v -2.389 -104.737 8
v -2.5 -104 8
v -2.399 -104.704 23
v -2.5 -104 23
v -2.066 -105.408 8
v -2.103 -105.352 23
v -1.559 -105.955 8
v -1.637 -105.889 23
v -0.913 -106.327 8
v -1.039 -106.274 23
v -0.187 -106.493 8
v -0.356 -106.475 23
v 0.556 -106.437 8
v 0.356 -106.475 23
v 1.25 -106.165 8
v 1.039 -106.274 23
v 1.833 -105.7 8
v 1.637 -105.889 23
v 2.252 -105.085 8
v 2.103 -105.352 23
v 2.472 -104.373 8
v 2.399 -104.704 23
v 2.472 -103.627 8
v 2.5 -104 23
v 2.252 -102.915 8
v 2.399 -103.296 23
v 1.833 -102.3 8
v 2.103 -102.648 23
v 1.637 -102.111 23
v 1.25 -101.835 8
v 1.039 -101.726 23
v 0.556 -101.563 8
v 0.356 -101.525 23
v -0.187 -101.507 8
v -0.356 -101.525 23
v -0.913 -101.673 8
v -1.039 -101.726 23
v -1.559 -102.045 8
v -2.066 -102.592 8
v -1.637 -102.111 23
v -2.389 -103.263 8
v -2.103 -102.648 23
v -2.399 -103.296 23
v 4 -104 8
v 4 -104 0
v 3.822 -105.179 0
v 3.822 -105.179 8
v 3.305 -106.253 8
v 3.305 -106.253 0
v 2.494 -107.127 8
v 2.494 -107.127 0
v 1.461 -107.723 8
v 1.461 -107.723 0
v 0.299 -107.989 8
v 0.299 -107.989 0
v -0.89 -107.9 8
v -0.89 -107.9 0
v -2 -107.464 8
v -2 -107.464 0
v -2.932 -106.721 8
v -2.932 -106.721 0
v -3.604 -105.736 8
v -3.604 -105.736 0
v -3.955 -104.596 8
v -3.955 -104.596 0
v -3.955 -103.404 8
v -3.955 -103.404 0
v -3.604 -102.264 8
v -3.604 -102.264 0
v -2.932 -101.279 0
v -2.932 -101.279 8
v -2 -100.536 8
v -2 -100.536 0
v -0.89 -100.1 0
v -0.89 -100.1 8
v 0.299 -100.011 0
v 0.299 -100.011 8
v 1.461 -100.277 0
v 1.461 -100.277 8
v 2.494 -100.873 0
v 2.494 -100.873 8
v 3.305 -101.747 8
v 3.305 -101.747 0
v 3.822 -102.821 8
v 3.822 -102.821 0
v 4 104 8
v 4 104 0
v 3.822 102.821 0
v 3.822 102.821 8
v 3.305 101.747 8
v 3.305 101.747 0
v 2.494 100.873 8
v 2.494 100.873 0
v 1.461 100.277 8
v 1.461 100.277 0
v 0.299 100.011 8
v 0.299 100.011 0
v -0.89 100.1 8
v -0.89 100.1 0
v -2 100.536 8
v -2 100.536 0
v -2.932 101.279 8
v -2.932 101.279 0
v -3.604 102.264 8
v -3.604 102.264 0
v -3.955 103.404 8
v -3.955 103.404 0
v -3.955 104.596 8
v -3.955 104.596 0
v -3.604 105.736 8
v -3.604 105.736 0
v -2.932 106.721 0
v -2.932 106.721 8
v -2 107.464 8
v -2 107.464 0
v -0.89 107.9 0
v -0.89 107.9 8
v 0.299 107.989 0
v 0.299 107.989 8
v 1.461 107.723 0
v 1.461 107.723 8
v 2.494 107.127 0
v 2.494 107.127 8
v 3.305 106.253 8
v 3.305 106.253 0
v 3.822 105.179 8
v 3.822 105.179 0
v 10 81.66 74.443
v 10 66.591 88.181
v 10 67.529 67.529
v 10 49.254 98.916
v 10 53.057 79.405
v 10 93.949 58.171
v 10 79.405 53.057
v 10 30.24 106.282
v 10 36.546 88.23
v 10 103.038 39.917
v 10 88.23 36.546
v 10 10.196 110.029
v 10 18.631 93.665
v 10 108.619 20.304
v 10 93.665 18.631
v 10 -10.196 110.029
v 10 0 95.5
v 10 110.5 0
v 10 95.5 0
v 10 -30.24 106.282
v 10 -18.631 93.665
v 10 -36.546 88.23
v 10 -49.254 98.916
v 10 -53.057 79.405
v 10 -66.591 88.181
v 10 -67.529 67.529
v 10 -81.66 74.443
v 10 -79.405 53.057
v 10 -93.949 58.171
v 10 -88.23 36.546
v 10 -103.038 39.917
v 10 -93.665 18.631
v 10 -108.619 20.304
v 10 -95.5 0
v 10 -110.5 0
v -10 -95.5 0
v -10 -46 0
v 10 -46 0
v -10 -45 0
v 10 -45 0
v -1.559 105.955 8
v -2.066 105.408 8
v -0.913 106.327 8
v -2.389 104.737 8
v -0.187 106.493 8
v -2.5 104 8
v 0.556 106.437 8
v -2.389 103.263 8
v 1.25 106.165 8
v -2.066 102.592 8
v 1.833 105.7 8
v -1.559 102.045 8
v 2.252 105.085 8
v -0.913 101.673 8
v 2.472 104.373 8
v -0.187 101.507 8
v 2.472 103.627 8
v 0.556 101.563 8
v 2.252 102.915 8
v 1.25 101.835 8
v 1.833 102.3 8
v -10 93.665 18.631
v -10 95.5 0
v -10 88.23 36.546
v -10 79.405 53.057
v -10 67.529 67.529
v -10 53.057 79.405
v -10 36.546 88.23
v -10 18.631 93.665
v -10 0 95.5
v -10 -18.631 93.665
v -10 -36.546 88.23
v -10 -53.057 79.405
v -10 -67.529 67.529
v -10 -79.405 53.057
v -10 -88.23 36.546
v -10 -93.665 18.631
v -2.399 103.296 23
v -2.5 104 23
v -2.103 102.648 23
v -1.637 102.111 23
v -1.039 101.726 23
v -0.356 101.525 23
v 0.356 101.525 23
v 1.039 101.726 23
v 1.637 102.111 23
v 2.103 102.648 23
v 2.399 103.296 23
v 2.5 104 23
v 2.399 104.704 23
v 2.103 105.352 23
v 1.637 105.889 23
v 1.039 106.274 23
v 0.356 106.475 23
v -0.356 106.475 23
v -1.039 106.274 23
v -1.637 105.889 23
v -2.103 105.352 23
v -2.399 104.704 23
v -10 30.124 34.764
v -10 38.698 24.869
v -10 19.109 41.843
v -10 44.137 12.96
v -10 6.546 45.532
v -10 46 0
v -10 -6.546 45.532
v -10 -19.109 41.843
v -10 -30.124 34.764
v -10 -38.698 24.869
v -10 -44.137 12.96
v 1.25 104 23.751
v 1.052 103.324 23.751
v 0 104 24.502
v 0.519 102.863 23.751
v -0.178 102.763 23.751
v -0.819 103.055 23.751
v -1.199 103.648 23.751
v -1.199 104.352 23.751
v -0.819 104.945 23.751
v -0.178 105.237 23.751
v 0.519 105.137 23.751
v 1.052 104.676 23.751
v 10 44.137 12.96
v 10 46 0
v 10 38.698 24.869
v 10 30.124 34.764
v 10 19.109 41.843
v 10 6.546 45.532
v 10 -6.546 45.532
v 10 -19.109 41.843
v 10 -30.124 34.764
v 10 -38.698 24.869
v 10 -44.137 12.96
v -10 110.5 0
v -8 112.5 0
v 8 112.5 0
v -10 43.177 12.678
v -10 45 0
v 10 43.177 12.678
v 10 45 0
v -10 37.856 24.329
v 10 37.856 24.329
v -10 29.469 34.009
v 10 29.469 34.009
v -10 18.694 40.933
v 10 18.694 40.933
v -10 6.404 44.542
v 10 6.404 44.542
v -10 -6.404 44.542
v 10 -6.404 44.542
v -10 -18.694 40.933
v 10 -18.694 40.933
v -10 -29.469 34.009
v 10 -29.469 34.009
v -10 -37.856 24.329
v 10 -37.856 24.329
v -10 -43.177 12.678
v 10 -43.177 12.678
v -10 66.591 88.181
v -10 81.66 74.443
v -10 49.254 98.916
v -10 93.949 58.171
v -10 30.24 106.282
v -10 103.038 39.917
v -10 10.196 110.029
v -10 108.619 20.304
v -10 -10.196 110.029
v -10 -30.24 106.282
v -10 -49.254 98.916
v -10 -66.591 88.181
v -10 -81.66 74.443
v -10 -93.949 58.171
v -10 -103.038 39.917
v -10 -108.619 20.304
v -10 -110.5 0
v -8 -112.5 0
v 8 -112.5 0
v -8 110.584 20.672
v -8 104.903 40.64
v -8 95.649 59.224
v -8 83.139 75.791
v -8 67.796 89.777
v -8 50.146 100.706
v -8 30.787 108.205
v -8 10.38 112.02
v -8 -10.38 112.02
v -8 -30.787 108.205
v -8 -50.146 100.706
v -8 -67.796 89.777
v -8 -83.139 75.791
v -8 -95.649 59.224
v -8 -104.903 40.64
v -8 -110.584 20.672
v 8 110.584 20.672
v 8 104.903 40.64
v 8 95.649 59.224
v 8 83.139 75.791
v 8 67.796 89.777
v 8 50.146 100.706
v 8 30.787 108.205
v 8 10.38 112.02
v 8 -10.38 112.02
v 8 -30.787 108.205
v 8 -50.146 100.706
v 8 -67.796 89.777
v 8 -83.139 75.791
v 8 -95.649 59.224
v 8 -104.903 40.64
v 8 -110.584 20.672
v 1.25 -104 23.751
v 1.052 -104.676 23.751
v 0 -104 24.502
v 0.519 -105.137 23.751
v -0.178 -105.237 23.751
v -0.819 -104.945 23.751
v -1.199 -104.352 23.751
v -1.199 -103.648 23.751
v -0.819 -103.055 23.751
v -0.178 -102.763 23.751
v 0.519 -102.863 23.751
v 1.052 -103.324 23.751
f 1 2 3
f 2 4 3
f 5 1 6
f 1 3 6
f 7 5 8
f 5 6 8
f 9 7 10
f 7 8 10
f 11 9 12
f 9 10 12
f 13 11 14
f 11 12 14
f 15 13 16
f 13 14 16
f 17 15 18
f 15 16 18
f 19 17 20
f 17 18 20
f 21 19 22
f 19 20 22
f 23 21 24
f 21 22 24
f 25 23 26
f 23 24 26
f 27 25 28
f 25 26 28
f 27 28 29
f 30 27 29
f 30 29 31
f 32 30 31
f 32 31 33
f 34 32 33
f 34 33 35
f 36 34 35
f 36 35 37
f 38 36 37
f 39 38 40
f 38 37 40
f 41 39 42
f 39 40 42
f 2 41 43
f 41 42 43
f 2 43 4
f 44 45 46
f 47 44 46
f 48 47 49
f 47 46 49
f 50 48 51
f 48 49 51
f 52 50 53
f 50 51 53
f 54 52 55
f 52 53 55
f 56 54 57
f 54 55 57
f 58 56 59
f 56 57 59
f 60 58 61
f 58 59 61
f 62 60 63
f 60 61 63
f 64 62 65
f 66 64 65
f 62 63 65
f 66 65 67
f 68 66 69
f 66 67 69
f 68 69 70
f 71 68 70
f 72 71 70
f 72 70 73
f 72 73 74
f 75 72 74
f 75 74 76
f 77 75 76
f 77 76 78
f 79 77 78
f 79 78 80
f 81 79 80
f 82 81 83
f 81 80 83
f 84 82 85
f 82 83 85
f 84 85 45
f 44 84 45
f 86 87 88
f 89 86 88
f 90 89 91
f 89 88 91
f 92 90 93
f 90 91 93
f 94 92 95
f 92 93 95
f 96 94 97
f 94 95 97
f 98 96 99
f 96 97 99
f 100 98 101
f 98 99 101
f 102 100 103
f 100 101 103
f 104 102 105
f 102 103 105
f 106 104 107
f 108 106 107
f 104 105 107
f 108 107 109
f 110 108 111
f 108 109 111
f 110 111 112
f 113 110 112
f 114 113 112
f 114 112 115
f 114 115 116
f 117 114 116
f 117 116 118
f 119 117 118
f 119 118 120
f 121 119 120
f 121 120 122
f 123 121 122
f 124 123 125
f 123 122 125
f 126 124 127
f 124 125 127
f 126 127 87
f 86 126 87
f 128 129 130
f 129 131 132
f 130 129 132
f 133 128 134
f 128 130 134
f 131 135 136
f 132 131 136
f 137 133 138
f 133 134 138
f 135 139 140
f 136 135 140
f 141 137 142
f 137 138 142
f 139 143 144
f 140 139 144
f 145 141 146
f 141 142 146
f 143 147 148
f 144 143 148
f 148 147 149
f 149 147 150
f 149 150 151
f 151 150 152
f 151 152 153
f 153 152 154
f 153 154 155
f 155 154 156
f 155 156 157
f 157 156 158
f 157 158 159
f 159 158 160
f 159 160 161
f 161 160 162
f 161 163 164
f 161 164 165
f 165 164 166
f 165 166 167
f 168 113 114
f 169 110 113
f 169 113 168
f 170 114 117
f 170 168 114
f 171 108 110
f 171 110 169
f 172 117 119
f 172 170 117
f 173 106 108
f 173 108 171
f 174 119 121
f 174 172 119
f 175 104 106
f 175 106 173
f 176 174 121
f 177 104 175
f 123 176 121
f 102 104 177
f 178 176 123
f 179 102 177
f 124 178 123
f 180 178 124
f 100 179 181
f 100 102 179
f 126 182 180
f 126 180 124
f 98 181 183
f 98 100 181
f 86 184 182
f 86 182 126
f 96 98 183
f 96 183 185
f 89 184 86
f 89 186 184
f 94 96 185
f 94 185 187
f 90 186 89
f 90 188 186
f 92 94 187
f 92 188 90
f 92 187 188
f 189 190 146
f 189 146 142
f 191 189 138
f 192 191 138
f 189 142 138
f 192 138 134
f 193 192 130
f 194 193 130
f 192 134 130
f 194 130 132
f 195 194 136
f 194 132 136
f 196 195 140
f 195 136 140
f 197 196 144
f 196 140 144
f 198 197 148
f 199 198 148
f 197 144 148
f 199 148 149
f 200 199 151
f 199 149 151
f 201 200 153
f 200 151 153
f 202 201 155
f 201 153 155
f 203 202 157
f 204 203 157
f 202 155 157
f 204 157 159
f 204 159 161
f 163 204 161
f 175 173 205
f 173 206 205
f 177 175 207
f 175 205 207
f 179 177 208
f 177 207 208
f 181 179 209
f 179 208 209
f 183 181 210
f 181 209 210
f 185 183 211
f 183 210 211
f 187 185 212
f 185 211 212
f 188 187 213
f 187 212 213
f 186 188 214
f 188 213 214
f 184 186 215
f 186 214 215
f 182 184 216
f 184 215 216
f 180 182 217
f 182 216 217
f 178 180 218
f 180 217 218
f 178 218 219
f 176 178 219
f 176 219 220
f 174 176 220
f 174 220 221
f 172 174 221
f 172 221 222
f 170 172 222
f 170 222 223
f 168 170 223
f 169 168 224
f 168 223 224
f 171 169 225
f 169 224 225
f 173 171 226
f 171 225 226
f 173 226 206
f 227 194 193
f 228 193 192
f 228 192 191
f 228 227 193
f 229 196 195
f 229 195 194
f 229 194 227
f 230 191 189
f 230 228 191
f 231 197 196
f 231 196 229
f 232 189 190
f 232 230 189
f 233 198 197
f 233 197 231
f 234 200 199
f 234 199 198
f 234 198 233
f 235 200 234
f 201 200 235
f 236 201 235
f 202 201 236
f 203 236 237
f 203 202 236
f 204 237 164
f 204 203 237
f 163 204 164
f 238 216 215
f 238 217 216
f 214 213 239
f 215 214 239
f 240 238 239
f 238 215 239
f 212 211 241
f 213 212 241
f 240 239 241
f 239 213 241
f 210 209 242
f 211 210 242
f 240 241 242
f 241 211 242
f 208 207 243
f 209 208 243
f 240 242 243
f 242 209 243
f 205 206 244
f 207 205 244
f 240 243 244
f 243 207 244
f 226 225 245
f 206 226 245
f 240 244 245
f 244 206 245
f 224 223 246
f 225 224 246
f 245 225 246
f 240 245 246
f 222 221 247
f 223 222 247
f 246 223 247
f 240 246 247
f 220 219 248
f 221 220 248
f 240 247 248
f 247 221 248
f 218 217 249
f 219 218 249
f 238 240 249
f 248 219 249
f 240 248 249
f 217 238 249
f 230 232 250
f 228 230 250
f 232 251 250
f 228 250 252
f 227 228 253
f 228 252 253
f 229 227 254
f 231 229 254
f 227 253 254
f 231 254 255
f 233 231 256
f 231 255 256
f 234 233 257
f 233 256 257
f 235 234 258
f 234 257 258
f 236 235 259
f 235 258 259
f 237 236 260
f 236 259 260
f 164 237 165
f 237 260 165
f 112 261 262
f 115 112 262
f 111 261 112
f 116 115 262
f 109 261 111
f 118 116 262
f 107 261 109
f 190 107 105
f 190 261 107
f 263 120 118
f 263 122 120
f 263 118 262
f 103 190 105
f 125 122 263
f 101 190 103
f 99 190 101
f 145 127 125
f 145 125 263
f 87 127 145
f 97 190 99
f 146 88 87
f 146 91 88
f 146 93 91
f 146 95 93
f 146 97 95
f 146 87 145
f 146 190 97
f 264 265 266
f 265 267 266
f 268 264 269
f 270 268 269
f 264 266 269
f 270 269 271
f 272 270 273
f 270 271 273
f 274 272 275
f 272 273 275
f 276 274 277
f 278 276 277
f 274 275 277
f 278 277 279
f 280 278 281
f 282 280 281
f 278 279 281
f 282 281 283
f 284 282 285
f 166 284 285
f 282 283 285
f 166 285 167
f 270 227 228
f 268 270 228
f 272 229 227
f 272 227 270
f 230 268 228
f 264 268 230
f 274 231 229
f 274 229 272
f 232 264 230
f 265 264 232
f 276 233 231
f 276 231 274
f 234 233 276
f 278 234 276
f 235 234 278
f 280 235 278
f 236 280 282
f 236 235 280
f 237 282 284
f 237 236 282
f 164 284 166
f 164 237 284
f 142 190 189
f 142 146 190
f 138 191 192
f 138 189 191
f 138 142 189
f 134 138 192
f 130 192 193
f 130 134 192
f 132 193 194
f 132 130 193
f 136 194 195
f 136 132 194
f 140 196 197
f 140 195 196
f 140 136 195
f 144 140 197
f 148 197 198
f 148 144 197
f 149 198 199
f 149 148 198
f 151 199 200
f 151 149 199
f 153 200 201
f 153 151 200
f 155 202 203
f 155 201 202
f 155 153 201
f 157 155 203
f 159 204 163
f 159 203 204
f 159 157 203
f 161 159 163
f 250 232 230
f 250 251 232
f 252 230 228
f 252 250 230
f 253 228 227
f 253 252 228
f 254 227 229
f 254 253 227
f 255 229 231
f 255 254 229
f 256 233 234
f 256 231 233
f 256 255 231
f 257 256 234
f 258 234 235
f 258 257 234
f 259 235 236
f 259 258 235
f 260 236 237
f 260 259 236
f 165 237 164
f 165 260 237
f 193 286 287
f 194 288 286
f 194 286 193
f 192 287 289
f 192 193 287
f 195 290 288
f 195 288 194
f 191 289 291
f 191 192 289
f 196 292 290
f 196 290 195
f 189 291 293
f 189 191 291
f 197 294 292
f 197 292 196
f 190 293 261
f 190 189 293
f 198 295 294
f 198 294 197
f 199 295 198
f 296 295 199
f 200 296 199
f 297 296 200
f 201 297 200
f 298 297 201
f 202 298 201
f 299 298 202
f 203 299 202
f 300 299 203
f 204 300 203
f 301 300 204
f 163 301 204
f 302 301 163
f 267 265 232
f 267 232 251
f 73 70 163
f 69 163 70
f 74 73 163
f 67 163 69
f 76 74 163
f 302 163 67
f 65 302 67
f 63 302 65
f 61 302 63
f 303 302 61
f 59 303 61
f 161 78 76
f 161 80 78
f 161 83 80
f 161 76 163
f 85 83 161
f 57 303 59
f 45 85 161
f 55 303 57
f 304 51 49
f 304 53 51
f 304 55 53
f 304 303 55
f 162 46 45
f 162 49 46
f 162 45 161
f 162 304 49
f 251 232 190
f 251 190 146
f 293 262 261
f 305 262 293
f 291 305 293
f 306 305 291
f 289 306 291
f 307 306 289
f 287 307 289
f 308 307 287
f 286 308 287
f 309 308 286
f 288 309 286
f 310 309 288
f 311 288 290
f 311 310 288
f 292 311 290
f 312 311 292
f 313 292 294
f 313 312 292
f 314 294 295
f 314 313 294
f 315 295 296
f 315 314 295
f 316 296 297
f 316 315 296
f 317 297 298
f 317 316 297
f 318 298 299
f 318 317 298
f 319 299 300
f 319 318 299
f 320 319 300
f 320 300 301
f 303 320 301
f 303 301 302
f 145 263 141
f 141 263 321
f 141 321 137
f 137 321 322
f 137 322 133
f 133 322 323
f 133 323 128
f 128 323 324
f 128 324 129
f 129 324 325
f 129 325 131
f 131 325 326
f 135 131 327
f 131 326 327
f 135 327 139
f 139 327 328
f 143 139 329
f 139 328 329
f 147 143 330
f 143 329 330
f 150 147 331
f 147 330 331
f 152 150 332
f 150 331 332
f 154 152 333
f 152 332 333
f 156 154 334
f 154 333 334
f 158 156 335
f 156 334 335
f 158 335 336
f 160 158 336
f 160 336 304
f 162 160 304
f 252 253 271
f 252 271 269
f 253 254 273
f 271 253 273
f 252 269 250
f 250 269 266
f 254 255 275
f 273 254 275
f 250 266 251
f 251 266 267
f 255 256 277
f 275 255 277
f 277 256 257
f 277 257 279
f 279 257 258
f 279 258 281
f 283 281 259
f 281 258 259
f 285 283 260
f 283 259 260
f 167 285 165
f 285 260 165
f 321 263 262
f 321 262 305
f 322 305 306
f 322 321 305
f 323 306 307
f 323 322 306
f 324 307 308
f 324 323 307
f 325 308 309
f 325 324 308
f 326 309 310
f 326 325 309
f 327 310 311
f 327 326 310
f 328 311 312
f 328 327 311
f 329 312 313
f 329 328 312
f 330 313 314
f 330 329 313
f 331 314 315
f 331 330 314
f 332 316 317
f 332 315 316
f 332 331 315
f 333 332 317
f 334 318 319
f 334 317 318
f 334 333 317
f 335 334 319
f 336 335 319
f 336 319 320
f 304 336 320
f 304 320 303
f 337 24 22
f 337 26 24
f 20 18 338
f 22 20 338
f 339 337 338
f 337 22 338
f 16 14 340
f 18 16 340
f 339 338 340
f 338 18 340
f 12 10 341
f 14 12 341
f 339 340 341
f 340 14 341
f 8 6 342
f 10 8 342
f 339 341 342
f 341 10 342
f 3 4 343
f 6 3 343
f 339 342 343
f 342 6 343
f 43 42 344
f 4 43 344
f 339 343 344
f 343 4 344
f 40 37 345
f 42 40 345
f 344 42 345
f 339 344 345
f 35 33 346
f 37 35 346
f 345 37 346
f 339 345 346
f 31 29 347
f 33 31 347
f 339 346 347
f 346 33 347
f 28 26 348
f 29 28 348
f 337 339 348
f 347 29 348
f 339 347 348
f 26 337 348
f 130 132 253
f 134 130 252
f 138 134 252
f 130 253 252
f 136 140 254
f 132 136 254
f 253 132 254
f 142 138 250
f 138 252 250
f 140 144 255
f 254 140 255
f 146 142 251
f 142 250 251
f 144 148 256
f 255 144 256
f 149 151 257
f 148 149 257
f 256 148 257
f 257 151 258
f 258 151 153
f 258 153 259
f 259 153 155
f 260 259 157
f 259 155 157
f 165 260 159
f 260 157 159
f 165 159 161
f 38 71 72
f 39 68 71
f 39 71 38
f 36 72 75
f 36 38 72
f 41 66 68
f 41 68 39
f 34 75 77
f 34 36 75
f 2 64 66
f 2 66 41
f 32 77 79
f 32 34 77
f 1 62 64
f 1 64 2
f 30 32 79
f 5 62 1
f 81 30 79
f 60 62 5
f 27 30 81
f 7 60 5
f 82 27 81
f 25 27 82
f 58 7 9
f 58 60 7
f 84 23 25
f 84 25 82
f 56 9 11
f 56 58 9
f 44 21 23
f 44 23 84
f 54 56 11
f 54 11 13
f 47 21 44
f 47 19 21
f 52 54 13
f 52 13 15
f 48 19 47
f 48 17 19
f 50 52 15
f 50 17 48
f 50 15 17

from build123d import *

# Parameters (mm, degrees)
F0_W           = 20
F0_H           = 1
F2_W           = 20
F2_H           = 49.5
F4_W           = 20
F4_H           = 17
F8_SIZE        = 2
F9_W           = 20
F9_H           = 115
F10_DEPTH      = 112.501
F10_DEPTH_BACK = 112.501
F11_R          = 4
F12_DEPTH      = 8
F14_D          = 5
F14_DEPTH      = 15
F14_TIP        = 1.5021515476


with BuildPart() as f1:
    # F0 (on Front) → F1 (revolve)
    with BuildSketch(Plane.XZ):
        with Locations((0, 45.5)):
            Rectangle(F0_W, F0_H)
    revolve(axis=Axis((0, 0, 0), (1, 0, 0)))


with BuildPart() as f3:
    # F2 (on Front) → F3 (revolve)
    with BuildSketch(Plane.XZ):
        with Locations((0, 70.75)):
            Rectangle(F2_W, F2_H)
    revolve(axis=Axis((0, 0, 0), (1, 0, 0)))


with BuildPart() as f5:
    # F4 (on Front) → F5 (revolve)
    with BuildSketch(Plane.XZ):
        with Locations((0, 104)):
            Rectangle(F4_W, F4_H)
    revolve(axis=Axis((0, 0, 0), (1, 0, 0)))

    # F8
    f8_edges = [f5.edges().sort_by_distance(p)[0] for p in [
        (10, 0, -112.5),
        (-10, 0, -112.5),
    ]]
    chamfer(f8_edges, length=F8_SIZE)


with BuildPart() as f10_tool:
    # F9 (on Front) → F10 (new body, two sides)
    with BuildSketch(Plane.XZ) as f10_sk:
        with Locations((0, -57.5)):
            Rectangle(F9_W, F9_H)
    extrude(amount=F10_DEPTH)
    extrude(f10_sk.sketch, amount=-F10_DEPTH_BACK)


with BuildPart() as f1_1:
    add(f1.part)

    # F10: cut by f10_tool
    add(f10_tool.part, mode=Mode.SUBTRACT)


with BuildPart() as f3_1:
    add(f3.part)

    # F10: cut by f10_tool
    add(f10_tool.part, mode=Mode.SUBTRACT)


with BuildPart() as f5_1:
    add(f5.part)

    # F10: cut by f10_tool
    add(f10_tool.part, mode=Mode.SUBTRACT)

    # F11 (on face) → F12 (cut)
    with BuildSketch(Plane(origin=(0, 0, 0), x_dir=(1, 0, 0), z_dir=(0, 0, -1))):
        with Locations((0, 104)):
            Circle(F11_R)
        with Locations((0, -104)):
            Circle(F11_R)
    extrude(amount=-F12_DEPTH, mode=Mode.SUBTRACT)

    # F14
    with Locations(Plane(origin=(0, 0, 8), x_dir=(1, 0, 0), z_dir=(0, 0, -1))):
        with Locations((0, 104), (0, -104)):
            Hole(F14_D / 2, depth=F14_DEPTH)
            with Locations((0, 0, -(F14_DEPTH + F14_TIP / 2))):  # 118° drill point
                Cone(0, F14_D / 2, F14_TIP, mode=Mode.SUBTRACT)


solid = Compound([f1_1.part, f3_1.part, f5_1.part])
